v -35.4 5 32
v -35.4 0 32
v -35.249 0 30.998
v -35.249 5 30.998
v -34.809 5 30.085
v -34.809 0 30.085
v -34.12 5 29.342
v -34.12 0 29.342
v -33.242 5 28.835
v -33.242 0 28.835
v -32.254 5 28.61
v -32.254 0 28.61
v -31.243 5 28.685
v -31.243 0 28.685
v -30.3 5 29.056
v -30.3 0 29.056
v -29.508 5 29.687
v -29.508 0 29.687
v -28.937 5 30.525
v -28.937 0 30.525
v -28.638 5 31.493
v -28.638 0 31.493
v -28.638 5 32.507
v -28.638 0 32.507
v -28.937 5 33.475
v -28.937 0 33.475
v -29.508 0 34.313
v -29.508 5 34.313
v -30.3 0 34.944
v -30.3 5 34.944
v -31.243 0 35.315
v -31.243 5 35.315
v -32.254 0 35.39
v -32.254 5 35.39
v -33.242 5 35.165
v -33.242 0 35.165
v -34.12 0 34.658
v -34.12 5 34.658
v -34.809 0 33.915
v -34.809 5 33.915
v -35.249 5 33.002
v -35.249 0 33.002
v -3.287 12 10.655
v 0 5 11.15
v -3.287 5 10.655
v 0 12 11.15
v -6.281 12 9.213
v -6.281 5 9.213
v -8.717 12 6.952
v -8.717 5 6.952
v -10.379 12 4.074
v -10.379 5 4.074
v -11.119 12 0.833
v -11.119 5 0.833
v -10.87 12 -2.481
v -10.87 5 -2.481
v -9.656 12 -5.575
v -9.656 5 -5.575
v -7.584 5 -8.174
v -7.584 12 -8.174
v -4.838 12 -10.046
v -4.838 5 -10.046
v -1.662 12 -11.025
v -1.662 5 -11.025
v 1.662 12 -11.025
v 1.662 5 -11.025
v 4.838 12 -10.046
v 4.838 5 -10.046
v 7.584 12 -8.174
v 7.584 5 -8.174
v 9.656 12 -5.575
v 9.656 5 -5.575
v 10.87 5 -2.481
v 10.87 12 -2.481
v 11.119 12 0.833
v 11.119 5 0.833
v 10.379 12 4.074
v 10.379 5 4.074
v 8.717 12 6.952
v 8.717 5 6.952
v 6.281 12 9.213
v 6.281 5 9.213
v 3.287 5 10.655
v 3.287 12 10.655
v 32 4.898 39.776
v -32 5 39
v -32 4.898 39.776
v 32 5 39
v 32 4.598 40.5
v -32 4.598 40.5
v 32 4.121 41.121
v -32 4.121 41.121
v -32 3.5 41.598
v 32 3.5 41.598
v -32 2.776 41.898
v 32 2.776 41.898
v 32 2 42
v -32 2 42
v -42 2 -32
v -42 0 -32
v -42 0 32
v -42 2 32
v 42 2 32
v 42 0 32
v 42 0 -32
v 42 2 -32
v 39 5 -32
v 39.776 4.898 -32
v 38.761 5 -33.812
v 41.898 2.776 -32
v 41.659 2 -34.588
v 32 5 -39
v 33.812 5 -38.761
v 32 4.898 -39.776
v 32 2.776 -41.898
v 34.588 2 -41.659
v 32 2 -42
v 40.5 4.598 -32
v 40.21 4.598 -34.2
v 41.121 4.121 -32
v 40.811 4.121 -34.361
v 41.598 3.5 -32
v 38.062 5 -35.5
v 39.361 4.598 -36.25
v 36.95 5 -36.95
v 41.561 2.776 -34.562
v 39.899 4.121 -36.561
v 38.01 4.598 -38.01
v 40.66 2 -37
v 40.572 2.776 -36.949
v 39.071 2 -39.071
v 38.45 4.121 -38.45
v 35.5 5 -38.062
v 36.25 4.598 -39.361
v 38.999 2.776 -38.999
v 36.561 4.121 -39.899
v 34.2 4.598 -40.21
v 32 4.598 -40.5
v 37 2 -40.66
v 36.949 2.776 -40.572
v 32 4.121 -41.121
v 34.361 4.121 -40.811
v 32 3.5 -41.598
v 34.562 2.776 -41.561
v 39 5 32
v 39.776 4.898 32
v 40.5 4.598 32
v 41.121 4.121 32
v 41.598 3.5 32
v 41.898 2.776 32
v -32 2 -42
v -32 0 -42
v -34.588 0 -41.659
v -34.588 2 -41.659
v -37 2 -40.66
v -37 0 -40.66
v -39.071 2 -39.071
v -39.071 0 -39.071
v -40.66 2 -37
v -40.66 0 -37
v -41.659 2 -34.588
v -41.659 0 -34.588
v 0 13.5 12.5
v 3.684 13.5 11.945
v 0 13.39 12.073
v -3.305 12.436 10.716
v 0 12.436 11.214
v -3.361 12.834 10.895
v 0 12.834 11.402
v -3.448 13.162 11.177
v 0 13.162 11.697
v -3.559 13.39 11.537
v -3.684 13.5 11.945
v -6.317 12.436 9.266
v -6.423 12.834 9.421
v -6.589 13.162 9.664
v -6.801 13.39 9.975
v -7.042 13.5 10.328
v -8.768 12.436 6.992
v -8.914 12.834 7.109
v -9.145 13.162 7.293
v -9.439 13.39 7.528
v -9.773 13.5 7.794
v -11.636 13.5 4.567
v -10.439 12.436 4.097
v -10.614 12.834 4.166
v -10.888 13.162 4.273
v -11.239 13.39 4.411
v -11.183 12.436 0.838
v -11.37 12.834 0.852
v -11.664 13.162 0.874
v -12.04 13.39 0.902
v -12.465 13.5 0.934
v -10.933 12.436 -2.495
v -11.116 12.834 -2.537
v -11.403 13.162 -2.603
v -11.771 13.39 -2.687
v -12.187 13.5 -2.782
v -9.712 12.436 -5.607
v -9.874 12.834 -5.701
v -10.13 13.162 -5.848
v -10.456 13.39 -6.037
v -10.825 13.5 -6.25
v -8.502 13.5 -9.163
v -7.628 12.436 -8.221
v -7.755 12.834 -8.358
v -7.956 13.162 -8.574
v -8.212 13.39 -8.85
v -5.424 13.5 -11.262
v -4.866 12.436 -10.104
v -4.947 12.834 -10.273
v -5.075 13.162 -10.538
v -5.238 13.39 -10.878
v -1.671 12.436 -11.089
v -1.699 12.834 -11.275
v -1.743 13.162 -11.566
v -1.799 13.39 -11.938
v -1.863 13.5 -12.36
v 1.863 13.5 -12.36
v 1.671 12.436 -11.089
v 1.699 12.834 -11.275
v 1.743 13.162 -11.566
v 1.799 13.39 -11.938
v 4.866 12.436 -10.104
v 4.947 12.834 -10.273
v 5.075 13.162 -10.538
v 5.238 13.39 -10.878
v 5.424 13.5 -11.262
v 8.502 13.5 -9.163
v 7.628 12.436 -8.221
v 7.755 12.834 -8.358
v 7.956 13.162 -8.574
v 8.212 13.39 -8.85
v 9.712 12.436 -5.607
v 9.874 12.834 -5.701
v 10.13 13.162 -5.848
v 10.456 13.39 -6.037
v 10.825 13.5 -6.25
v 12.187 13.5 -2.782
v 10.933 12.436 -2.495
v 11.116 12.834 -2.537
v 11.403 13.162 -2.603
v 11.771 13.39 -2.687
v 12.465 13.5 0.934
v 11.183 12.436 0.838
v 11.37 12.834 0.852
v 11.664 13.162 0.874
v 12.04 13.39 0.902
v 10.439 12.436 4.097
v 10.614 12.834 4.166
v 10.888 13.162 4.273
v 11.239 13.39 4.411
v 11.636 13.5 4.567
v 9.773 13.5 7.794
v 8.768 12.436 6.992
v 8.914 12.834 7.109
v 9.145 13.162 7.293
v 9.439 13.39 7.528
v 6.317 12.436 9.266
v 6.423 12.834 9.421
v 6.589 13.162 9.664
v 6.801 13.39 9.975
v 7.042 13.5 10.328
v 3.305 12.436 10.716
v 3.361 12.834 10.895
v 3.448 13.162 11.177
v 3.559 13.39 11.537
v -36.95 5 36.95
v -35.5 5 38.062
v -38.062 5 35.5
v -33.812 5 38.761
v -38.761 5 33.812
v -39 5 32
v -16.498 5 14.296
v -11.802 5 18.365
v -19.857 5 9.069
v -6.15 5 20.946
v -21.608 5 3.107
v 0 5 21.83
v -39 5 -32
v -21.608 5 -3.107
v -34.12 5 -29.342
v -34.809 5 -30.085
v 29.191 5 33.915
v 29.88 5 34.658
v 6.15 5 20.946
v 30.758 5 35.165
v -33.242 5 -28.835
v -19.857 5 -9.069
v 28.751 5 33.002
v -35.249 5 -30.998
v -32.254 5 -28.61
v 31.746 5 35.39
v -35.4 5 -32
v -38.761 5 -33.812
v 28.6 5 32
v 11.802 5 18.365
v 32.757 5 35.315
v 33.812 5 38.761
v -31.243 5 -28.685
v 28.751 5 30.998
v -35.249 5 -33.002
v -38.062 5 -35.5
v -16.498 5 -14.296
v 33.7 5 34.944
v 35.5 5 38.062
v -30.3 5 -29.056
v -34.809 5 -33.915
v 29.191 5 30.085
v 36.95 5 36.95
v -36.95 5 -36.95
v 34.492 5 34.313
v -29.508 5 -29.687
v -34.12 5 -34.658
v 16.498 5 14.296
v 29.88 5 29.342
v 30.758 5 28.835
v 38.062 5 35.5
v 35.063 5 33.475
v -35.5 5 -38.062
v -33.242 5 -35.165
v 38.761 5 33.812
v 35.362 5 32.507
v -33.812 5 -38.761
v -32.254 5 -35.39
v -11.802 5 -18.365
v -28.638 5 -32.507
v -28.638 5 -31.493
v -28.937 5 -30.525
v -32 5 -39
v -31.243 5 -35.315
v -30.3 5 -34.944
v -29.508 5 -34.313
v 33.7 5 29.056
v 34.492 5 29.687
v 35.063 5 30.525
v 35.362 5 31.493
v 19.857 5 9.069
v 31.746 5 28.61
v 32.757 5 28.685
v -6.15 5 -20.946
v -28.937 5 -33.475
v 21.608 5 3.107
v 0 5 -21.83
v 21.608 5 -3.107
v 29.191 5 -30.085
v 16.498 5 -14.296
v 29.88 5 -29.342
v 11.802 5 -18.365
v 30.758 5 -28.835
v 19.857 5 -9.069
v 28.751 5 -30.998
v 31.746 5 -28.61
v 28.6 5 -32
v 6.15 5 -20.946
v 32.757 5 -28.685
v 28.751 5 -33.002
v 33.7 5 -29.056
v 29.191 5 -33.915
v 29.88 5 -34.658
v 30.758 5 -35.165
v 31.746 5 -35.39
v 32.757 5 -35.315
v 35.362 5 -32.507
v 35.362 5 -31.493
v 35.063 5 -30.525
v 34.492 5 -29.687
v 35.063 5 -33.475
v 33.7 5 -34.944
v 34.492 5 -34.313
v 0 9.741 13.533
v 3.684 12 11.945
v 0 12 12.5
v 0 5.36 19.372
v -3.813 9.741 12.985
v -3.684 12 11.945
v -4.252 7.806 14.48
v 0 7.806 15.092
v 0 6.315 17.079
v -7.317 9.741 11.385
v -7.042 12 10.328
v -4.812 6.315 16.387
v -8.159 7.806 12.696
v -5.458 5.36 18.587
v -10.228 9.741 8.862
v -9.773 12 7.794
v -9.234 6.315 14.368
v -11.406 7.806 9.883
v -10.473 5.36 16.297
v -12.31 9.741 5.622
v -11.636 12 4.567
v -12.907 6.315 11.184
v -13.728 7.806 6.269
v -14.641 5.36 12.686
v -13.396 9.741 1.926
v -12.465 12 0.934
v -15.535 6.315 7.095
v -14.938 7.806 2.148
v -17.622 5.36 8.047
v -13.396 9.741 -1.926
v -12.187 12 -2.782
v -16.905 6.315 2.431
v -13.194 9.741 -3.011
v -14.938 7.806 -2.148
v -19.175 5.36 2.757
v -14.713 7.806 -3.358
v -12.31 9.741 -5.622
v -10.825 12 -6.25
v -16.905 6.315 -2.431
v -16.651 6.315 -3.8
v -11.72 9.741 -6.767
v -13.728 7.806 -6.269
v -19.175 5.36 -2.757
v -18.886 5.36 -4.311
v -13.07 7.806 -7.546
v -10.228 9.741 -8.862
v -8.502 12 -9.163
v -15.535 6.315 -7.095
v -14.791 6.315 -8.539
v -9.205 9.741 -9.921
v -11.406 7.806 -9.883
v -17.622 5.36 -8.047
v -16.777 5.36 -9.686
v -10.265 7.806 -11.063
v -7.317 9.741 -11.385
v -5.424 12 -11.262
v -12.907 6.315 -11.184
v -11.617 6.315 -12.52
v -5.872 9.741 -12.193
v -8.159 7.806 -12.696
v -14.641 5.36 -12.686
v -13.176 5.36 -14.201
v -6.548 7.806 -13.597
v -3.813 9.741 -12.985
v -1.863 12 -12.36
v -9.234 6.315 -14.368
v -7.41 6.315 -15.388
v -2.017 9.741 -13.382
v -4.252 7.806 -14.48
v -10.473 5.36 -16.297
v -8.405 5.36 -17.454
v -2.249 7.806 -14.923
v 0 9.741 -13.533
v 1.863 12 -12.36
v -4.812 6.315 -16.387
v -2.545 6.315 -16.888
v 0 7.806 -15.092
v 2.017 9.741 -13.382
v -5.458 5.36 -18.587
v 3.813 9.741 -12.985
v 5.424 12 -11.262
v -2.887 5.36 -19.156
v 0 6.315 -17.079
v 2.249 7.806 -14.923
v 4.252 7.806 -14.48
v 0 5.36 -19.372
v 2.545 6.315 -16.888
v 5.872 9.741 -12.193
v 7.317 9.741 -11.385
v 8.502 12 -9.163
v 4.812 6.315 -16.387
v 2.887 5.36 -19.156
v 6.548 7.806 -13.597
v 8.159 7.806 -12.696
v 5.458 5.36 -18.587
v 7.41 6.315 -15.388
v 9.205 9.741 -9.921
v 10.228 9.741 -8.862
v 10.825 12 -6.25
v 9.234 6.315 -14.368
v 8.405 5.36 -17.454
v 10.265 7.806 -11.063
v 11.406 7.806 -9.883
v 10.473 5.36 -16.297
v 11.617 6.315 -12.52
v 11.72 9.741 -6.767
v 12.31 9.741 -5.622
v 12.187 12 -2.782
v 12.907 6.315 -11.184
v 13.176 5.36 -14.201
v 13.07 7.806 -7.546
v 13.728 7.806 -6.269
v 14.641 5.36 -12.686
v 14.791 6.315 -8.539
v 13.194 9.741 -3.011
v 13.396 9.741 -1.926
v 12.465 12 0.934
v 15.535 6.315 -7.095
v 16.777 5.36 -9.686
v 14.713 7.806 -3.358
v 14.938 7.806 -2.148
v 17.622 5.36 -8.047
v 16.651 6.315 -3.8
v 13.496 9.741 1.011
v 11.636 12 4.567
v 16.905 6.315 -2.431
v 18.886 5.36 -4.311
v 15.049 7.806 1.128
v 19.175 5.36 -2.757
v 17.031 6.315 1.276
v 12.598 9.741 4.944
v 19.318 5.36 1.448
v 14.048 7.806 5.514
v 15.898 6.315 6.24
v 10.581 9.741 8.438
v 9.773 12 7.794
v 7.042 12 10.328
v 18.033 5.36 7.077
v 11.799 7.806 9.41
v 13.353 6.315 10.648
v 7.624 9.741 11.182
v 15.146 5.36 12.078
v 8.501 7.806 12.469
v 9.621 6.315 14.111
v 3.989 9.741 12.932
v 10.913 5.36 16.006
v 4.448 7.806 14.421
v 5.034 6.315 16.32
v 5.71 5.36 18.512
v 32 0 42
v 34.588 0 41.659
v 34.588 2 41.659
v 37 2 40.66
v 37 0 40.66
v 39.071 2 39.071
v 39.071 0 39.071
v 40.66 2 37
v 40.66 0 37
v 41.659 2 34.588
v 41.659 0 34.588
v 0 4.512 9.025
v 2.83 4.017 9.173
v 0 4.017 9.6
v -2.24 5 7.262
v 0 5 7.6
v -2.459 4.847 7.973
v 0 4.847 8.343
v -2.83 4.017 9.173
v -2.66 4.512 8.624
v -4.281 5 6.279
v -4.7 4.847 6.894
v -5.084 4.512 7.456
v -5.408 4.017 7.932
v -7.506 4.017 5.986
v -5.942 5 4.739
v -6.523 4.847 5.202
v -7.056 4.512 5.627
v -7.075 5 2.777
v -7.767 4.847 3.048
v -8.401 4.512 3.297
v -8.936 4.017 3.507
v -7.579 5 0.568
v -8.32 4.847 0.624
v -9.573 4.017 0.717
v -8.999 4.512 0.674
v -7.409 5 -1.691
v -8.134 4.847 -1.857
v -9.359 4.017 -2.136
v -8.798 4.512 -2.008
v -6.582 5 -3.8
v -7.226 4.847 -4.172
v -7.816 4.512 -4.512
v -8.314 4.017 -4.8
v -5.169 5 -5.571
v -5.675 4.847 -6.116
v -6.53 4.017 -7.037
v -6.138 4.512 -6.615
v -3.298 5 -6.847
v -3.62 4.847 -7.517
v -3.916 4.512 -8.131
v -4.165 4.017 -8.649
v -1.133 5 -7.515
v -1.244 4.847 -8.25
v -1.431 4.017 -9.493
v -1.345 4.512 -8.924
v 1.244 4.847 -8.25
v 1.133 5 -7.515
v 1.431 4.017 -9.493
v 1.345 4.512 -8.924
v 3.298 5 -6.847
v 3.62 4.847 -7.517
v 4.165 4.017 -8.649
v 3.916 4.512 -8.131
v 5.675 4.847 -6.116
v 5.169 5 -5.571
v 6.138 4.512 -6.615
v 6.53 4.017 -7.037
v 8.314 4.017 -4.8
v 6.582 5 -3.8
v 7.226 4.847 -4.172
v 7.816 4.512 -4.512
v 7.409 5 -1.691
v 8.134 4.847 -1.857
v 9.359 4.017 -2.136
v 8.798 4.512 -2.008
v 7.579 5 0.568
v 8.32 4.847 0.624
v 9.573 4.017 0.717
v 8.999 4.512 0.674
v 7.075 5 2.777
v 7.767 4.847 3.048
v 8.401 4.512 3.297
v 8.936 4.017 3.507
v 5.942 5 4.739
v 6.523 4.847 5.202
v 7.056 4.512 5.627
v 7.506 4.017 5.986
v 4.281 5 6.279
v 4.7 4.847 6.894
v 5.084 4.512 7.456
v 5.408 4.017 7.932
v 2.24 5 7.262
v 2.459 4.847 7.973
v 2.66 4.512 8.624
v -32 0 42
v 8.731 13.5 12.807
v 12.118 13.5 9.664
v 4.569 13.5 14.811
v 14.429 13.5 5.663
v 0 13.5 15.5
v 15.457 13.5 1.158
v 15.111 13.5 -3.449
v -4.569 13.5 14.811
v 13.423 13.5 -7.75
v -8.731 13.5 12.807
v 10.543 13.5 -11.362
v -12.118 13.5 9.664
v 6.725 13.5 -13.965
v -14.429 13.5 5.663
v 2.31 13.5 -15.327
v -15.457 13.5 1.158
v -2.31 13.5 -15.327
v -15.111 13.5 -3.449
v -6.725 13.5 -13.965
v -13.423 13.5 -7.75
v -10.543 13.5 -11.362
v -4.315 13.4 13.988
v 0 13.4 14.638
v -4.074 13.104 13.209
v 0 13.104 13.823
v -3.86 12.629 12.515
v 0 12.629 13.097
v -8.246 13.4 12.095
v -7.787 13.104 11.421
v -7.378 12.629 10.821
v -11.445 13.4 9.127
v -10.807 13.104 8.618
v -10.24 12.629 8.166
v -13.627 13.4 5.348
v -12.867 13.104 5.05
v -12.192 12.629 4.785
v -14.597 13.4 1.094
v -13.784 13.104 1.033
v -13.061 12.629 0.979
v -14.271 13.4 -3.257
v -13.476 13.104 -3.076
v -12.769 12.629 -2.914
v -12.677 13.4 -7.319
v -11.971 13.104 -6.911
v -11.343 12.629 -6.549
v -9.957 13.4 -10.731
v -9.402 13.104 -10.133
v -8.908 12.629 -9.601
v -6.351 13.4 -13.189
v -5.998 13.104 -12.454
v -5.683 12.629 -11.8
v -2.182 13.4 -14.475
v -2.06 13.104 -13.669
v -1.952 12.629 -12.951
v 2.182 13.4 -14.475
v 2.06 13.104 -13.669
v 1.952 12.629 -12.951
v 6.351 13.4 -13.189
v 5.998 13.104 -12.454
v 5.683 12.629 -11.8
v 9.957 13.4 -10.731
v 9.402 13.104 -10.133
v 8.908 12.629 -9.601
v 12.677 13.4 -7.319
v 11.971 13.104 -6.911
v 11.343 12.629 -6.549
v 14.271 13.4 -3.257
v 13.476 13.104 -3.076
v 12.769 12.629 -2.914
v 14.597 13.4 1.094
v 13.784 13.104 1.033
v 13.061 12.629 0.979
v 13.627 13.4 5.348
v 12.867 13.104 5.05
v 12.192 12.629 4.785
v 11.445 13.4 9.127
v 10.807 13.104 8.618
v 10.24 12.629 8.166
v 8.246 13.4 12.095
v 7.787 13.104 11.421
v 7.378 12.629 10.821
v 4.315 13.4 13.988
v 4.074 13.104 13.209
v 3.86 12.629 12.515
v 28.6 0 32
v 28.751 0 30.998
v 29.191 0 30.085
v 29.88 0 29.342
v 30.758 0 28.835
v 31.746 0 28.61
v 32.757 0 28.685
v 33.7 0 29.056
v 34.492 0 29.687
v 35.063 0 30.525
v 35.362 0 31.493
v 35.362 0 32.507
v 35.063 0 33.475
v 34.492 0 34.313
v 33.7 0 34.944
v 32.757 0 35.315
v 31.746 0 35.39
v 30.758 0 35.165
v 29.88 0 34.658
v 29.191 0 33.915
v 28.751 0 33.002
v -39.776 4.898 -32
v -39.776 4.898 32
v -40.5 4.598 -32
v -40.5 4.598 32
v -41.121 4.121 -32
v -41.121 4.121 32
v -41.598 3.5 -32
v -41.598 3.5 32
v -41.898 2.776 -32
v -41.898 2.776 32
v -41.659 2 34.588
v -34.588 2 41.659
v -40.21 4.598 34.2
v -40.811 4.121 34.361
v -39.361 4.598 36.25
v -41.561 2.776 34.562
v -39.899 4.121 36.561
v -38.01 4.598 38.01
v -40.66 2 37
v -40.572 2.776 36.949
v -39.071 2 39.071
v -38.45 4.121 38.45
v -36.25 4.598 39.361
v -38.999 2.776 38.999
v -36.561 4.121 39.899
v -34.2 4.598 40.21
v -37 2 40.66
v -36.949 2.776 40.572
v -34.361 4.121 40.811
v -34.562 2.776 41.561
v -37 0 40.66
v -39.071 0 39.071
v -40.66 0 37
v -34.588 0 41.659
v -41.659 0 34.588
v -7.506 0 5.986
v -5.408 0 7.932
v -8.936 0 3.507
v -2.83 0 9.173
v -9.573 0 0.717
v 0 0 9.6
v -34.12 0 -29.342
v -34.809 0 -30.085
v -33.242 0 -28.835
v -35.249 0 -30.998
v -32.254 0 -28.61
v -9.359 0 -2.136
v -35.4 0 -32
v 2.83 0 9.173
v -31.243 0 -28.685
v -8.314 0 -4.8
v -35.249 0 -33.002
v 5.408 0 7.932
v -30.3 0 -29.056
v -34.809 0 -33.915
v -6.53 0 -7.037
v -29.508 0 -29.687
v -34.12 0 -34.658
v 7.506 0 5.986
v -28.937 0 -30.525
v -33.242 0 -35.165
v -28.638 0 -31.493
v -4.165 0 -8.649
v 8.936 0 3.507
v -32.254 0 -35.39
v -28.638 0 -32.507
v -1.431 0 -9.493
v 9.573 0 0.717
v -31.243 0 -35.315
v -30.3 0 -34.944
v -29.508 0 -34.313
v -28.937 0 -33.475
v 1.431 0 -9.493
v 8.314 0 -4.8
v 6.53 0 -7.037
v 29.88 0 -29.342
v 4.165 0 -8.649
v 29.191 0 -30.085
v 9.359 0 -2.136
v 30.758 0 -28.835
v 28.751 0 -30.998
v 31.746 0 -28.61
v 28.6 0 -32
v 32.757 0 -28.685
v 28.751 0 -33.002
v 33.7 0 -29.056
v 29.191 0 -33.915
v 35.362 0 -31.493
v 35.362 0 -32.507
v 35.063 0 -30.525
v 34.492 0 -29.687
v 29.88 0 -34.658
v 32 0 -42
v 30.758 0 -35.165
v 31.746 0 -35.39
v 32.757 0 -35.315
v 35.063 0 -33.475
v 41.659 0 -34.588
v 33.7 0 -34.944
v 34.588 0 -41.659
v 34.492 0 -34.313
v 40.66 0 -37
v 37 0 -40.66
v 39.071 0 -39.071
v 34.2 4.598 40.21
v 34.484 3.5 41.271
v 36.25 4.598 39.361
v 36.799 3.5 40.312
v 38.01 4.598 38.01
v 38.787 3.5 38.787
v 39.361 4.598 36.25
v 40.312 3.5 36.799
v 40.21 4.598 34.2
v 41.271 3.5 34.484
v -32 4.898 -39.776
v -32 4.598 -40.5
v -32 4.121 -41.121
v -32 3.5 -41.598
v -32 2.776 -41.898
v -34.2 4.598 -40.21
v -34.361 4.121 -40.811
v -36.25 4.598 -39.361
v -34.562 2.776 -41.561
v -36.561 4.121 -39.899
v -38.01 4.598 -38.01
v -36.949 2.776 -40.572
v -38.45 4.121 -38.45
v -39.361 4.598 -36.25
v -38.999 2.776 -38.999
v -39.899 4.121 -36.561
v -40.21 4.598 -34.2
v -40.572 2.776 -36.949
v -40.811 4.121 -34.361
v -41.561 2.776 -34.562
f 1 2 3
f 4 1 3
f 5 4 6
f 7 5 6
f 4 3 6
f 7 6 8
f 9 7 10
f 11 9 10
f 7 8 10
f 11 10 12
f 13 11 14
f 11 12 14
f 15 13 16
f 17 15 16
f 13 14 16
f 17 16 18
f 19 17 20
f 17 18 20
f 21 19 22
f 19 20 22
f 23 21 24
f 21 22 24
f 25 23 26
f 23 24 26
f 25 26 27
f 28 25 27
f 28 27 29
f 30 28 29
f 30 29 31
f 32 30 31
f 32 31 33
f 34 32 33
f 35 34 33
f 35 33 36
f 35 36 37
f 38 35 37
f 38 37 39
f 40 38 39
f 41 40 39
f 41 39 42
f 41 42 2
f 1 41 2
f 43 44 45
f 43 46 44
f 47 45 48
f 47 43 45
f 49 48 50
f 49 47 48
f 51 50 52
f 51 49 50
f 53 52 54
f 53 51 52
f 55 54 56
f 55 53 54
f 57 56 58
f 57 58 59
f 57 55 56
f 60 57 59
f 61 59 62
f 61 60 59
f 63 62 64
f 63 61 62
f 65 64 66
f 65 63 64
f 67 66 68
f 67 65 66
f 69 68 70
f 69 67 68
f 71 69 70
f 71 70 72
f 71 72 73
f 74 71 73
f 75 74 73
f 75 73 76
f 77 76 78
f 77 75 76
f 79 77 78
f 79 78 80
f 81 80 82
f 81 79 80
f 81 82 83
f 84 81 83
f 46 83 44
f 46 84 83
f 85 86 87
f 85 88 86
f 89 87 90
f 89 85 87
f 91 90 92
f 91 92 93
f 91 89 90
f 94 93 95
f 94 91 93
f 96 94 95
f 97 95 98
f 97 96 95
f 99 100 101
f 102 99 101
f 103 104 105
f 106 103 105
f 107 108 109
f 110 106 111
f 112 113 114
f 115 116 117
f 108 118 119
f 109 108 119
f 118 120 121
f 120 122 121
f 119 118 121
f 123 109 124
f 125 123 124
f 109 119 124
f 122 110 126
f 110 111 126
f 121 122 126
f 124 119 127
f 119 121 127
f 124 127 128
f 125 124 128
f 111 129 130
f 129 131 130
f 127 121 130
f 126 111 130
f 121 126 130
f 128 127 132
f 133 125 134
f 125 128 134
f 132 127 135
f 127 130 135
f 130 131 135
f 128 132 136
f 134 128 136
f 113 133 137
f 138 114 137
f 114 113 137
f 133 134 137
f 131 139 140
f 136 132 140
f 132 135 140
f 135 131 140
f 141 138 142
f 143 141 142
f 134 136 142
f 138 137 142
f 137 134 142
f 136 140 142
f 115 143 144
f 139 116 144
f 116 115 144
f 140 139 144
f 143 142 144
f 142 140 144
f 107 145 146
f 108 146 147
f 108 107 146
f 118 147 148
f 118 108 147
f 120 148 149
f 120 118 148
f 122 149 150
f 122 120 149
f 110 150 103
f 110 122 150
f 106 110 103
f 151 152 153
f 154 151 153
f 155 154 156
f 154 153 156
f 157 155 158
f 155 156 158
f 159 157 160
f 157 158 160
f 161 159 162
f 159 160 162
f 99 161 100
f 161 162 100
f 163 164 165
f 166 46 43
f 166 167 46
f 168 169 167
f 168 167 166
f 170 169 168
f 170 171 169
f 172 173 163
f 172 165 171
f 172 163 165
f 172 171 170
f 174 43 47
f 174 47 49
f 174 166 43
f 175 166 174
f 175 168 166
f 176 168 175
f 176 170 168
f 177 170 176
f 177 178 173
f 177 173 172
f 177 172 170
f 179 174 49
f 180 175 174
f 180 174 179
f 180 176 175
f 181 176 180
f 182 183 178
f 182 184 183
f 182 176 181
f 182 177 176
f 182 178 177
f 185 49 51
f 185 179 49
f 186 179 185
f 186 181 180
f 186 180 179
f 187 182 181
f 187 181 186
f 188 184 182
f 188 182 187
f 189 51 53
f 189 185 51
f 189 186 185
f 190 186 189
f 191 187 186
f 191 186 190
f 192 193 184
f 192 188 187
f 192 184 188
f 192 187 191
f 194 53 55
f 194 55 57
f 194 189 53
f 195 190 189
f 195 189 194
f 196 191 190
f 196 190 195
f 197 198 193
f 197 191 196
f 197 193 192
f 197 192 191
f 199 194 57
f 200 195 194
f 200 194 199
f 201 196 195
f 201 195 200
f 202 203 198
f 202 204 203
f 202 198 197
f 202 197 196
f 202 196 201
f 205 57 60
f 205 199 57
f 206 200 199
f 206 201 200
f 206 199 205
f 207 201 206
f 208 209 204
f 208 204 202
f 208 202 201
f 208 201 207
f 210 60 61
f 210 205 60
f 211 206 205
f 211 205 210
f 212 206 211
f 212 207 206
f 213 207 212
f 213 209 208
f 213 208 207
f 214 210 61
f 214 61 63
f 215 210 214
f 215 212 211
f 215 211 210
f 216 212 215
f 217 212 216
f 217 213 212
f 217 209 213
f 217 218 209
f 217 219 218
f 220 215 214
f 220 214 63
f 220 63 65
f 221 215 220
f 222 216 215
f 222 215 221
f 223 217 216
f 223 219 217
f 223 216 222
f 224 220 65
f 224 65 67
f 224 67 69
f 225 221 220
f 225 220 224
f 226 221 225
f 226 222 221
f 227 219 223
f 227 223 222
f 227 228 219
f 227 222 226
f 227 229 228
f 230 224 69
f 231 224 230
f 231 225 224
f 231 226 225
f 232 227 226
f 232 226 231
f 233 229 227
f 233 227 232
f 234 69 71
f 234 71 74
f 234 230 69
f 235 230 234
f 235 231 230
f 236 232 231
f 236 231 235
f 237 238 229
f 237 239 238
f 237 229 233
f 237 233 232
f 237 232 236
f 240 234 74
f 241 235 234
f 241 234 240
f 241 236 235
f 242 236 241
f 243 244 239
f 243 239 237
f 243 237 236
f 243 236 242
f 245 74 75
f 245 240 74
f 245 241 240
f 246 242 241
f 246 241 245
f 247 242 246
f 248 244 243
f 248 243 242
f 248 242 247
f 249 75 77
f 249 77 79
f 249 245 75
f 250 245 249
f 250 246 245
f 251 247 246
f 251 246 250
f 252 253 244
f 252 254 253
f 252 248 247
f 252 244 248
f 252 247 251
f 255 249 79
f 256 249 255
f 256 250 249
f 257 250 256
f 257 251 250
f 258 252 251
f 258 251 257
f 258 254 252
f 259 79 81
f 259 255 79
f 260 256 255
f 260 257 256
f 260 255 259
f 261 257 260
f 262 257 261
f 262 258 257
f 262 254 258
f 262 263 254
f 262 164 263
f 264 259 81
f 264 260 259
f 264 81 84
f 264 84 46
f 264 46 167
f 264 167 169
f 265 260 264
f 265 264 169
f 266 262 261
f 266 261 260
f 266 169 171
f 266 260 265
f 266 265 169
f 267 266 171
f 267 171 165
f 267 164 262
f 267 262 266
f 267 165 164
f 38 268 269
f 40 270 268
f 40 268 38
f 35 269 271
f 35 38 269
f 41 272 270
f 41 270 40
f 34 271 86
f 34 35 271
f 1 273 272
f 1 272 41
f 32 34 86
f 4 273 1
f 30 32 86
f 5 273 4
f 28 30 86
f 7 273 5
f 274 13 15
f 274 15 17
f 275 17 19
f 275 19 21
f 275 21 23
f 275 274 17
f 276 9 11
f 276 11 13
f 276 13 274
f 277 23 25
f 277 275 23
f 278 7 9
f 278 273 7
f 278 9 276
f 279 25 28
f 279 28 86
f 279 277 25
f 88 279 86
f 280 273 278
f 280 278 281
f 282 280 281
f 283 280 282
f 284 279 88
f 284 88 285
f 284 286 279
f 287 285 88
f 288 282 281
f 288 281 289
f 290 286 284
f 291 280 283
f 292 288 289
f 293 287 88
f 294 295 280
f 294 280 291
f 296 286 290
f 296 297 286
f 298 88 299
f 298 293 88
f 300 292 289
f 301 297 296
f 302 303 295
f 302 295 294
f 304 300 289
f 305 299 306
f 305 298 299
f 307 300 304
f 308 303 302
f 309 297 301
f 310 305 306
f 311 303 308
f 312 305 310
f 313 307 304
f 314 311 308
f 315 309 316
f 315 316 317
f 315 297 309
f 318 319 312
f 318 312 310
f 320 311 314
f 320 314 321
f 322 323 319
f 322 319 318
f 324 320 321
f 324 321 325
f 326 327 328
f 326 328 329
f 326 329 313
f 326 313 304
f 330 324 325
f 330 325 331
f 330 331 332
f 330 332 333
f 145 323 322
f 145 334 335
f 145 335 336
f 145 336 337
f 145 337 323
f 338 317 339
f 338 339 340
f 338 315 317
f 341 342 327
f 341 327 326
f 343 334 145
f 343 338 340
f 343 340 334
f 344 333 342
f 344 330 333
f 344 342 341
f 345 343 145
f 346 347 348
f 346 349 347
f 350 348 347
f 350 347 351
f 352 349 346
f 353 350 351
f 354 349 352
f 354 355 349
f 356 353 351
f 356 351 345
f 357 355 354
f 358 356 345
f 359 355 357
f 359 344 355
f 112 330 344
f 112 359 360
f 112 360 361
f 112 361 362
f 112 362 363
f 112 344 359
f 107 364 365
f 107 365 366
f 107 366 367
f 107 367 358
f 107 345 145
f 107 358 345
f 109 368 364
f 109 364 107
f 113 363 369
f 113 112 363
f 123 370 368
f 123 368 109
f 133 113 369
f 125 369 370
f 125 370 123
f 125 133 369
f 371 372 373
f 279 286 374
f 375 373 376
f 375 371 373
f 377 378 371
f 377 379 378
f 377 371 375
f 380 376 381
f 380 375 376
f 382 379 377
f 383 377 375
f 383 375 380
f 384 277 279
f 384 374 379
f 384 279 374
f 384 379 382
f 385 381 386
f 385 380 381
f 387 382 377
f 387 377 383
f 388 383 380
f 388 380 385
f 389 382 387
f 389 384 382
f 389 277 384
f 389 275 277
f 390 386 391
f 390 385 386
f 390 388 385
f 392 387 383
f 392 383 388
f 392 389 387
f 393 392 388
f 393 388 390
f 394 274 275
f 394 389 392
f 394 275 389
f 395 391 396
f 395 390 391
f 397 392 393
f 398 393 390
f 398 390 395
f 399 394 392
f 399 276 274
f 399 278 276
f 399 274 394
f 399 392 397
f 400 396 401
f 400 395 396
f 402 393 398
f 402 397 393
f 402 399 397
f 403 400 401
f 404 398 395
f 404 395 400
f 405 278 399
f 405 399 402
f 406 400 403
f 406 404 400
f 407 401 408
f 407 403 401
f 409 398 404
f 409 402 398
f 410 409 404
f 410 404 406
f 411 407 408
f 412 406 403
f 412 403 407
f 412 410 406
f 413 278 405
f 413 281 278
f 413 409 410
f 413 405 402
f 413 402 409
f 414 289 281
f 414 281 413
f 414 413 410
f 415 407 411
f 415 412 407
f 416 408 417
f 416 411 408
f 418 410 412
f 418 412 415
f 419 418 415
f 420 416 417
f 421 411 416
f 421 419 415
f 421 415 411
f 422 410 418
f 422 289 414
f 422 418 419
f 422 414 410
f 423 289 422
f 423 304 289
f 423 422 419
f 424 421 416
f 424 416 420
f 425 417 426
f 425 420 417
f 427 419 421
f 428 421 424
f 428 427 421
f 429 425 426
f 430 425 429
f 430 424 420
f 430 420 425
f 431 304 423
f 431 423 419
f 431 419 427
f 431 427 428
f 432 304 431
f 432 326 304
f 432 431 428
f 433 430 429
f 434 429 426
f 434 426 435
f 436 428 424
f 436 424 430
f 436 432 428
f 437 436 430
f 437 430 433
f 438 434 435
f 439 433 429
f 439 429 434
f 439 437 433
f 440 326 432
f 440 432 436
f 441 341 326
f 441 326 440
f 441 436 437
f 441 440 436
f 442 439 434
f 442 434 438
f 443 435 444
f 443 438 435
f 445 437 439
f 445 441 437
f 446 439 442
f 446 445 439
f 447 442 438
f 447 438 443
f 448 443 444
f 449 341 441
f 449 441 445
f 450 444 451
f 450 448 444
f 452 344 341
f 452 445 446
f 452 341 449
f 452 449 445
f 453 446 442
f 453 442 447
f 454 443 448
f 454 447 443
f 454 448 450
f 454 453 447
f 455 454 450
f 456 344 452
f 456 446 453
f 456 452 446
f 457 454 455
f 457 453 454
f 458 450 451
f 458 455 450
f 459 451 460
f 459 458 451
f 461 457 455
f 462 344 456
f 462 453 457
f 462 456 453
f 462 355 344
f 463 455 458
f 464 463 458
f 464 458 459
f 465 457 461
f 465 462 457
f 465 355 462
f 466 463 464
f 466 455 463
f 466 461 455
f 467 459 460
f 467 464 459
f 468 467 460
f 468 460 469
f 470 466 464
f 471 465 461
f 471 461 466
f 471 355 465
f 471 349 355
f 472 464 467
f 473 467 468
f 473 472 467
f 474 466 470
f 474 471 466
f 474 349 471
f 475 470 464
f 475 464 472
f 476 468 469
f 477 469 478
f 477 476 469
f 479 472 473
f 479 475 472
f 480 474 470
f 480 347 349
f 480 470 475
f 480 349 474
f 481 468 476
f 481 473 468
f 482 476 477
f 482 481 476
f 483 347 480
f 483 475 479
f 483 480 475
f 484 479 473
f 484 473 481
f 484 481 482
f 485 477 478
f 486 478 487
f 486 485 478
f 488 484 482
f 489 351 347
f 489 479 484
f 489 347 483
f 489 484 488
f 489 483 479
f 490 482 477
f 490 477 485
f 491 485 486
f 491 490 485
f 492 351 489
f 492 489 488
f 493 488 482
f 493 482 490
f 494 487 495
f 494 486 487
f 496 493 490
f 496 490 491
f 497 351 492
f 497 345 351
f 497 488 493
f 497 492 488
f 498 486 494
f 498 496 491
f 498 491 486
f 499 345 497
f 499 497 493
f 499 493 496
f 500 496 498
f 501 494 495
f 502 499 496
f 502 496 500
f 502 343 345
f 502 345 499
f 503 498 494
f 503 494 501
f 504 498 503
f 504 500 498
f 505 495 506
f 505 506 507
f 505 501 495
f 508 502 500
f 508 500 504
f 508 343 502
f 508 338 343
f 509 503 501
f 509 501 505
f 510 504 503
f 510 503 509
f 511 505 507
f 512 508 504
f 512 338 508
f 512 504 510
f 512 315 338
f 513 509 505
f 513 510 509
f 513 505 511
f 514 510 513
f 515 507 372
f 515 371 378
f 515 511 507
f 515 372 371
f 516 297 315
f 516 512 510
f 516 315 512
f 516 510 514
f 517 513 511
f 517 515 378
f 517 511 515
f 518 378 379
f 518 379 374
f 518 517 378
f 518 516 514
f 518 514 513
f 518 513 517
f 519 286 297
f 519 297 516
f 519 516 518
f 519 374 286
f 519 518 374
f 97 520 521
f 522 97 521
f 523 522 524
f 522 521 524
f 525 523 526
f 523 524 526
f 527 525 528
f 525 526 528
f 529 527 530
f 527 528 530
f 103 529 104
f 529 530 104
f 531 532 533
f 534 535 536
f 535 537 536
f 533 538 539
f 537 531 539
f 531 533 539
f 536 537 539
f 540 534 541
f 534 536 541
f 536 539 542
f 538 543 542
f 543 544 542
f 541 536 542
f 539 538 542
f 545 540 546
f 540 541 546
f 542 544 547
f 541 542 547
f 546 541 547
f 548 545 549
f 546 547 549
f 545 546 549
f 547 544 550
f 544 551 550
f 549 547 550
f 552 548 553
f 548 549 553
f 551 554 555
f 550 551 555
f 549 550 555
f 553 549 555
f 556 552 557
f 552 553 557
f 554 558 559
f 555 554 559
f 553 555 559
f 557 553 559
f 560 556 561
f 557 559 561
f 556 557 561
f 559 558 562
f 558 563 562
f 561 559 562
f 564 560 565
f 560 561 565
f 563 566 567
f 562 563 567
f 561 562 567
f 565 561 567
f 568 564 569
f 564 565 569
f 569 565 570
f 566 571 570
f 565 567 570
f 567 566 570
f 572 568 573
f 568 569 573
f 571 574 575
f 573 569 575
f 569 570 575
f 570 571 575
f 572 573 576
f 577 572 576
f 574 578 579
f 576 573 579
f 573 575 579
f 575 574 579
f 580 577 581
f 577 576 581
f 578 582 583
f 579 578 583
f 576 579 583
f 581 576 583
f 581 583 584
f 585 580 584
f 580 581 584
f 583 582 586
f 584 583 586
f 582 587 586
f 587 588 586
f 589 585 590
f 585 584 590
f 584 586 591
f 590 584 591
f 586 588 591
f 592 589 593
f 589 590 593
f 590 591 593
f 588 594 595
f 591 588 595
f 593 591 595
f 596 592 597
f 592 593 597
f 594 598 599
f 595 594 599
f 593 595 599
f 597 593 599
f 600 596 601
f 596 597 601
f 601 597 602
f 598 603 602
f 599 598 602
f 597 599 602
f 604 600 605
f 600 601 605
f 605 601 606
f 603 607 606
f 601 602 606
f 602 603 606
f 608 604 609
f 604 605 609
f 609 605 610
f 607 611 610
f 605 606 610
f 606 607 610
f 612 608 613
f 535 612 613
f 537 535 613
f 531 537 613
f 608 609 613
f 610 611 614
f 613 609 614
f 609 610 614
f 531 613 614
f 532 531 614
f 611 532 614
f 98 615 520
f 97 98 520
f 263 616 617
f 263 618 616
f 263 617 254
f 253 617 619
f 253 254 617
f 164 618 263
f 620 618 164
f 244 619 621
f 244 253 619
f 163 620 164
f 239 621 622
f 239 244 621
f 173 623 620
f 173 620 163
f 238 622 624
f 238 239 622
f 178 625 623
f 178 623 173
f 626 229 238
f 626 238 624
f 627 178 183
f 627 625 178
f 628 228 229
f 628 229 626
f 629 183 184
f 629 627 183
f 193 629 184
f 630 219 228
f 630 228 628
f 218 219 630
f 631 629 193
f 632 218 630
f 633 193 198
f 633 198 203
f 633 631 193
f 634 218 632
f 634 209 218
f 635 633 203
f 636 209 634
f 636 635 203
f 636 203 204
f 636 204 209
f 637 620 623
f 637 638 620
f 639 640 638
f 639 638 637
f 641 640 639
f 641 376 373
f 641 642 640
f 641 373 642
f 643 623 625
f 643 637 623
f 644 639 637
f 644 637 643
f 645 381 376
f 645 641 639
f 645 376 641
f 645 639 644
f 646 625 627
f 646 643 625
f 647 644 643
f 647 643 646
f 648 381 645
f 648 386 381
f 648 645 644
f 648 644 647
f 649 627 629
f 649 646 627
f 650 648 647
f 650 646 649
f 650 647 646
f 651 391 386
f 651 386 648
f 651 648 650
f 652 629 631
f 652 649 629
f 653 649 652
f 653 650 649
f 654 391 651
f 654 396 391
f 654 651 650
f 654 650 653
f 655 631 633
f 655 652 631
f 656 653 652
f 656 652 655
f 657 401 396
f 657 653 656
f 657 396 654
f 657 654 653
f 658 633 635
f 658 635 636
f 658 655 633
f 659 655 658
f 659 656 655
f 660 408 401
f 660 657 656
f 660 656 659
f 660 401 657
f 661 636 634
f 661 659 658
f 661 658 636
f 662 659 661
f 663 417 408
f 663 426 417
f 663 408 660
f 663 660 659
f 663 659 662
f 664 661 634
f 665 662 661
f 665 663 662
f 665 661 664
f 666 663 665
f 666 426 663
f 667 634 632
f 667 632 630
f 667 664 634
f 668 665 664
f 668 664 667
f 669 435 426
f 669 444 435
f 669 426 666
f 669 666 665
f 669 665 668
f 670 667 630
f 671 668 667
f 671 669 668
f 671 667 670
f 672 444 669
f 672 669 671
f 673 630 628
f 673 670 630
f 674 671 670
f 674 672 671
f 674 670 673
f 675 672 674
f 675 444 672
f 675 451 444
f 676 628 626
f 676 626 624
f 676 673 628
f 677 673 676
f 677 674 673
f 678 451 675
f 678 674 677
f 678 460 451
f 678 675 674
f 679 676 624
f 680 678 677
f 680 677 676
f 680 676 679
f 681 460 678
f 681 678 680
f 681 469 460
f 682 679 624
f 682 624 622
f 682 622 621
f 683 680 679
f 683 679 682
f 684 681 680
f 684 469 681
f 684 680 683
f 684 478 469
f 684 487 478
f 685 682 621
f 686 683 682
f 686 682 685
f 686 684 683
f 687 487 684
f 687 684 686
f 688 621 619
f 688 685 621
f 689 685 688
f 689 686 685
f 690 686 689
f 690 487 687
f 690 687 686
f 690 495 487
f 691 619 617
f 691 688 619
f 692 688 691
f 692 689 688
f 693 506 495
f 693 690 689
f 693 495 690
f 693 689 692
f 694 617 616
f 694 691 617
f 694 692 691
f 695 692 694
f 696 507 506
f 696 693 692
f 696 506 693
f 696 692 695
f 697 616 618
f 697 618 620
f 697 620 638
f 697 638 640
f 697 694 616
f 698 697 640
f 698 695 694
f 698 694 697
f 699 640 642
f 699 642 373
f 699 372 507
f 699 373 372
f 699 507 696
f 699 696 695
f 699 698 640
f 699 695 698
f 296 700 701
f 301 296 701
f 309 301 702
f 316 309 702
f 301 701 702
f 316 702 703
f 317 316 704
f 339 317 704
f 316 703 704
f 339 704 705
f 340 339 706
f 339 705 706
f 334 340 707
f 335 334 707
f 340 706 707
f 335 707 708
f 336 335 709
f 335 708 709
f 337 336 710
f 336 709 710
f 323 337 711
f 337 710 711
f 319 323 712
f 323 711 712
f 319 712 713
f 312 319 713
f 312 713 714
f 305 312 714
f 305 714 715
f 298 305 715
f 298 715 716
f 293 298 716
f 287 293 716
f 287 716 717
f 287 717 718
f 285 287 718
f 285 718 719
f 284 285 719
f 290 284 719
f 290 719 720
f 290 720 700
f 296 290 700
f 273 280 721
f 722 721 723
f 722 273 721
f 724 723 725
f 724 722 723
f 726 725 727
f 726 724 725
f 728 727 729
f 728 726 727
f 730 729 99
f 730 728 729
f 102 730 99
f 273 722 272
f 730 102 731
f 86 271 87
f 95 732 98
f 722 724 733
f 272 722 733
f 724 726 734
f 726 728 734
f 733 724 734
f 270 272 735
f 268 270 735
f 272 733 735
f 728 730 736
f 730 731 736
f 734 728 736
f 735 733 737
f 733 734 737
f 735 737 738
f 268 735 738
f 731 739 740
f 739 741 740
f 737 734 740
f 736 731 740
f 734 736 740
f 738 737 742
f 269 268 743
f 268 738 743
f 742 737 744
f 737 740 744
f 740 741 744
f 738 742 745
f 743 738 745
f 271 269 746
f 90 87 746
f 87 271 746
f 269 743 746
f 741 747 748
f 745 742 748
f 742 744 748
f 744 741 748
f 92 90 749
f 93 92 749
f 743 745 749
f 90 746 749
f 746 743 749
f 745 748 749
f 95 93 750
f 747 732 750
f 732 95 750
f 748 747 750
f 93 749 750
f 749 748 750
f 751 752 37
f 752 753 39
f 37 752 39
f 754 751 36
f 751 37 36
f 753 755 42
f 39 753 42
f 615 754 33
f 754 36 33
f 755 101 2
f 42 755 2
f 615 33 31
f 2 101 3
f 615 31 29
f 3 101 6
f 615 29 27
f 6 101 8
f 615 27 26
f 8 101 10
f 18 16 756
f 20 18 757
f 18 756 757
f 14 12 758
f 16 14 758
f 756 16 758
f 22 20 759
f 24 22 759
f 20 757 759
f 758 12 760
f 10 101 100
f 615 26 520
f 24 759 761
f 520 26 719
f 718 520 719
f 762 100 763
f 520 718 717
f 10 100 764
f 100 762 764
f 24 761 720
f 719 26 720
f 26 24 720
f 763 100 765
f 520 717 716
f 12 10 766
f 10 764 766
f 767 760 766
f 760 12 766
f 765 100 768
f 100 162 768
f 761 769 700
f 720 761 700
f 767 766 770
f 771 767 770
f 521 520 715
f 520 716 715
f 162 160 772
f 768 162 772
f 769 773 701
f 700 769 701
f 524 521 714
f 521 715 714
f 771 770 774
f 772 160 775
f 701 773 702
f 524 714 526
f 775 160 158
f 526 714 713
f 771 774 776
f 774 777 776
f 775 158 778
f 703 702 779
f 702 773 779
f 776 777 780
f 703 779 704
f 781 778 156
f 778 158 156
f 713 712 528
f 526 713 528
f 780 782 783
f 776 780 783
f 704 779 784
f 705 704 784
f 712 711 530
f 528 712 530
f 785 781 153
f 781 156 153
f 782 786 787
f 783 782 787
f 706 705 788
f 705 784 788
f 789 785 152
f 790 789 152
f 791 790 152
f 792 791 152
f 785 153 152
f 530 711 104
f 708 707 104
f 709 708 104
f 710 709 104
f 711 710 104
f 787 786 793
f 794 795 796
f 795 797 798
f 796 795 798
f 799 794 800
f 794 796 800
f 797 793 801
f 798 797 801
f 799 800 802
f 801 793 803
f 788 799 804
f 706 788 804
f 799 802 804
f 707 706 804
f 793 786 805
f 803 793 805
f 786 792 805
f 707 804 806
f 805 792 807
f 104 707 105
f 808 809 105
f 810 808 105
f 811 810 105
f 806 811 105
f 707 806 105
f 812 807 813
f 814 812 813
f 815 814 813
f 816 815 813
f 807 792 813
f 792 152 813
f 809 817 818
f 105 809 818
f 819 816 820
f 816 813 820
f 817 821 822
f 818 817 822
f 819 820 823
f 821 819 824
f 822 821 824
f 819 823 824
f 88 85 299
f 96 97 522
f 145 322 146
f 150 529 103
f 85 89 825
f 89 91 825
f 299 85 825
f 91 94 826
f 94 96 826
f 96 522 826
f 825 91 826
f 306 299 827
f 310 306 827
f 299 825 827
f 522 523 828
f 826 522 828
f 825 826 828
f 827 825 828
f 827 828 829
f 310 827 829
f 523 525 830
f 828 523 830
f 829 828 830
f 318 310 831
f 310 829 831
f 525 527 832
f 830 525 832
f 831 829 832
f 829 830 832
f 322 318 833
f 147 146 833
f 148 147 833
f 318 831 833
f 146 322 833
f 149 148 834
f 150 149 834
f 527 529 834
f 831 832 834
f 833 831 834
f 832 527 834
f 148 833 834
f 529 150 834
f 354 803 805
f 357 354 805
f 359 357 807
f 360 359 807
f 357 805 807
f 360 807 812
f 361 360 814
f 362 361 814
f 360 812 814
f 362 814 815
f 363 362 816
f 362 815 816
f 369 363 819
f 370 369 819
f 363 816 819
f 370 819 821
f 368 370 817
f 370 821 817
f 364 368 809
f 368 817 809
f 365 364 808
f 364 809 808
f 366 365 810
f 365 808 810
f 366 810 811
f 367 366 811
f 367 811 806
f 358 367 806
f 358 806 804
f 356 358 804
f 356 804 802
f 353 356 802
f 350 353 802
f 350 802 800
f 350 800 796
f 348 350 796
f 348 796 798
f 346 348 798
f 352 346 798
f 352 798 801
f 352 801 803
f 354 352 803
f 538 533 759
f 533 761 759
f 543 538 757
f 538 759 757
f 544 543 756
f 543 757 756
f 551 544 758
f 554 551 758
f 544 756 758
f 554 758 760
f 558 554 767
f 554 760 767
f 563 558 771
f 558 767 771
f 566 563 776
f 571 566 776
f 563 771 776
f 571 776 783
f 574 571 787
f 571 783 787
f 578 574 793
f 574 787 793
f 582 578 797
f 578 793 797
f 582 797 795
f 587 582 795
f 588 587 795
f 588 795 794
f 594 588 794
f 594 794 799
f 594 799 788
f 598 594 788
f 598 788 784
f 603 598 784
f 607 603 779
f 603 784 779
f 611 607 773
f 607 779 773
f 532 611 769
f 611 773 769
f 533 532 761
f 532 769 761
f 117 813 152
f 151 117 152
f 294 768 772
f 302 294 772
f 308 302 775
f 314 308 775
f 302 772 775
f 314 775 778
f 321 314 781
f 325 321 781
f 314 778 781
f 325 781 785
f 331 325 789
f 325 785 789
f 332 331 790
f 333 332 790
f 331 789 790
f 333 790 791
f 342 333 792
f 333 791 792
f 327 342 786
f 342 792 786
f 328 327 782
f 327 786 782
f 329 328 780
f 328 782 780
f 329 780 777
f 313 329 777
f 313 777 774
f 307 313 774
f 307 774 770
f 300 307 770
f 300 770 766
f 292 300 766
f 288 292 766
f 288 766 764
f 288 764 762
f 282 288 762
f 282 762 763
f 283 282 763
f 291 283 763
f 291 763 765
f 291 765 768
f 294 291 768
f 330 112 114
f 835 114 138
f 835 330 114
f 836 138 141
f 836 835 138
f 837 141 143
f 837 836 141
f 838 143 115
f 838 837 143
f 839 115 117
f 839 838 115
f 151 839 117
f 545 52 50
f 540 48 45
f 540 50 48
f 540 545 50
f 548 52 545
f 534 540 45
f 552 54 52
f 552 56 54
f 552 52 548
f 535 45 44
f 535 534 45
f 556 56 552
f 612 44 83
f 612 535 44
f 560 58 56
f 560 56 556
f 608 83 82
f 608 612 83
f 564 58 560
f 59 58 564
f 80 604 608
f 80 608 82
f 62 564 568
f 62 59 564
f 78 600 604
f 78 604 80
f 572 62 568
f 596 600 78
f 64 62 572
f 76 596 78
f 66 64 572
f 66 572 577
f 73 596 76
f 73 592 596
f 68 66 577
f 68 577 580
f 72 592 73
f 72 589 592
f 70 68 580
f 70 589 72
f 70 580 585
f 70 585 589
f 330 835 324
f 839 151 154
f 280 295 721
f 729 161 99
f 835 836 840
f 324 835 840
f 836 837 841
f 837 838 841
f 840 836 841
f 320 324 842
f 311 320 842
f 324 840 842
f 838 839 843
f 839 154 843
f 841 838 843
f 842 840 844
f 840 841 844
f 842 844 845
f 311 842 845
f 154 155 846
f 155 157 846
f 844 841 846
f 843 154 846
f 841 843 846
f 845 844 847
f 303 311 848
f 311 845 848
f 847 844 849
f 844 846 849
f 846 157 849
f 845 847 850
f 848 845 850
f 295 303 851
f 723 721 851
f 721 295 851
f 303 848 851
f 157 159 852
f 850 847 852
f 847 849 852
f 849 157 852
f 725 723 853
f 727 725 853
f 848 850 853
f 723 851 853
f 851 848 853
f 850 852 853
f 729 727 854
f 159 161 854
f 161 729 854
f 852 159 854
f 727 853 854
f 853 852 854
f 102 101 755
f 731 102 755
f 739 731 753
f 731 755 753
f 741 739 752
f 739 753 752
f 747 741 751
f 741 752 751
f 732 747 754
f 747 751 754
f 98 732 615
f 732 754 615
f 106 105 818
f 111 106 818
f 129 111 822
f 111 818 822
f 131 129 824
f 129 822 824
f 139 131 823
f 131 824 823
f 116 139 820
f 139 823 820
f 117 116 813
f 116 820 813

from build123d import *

# Parameters (mm, degrees)
BOSS_EXTRUDE1_DEPTH              = 5
FILLET1_R                        = 3
TAP_DRILL_FOR_M8X1_25_TAP1_D     = 6.8
TAP_DRILL_FOR_M8X1_25_TAP1_DEPTH = 8
TAP_DRILL_FOR_M8X1_25_TAP1_TIP   = 2.042926105


with BuildPart() as part:
    # Sketch1 → Boss-Extrude1 (new body)
    with BuildSketch(Plane(origin=(0, 0, 0), x_dir=(1, 0, 0), z_dir=(0, 1, 0))):
        with BuildLine():
            Line((32, 42), (-32, 42))
            ThreePointArc((-32, 42), (-39.071067812, 39.071067812), (-42, 32))
            Line((-42, 32), (-42, -32))
            ThreePointArc((-42, -32), (-39.071067812, -39.071067812), (-32, -42))
            Line((-32, -42), (32, -42))
            ThreePointArc((32, -42), (39.071067812, -39.071067812), (42, -32))
            Line((42, -32), (42, 32))
            ThreePointArc((42, 32), (39.071067812, 39.071067812), (32, 42))
        make_face()
    extrude(amount=BOSS_EXTRUDE1_DEPTH)

    # Sketch3 → Revolve2 (revolve)
    with BuildSketch(Plane.XY):
        with BuildLine():
            Line((-21.830169384, 5), (-11.15, 5))
            Line((-11.15, 5), (-11.15, 12))
            ThreePointArc((-11.15, 12), (-11.537197996, 13.009021804), (-12.5, 13.5))
            Line((-12.5, 13.5), (-15.5, 13.5))
            ThreePointArc((-15.5, 13.5), (-13.822949017, 13.104101966), (-12.5, 12))
            ThreePointArc((-12.5, 12), (-16.03878275, 6.998773158), (-21.830169384, 5))
        make_face()
    revolve(axis=Axis((0, 0, 0), (0, -1, 0)))

    # Sketch3<5> → Cut-Revolve2 (revolve, cut)
    with BuildSketch(Plane.XY):
        with BuildLine():
            Line((0, 0), (0, 5))
            Line((0, 5), (-7.6, 5))
            ThreePointArc((-7.6, 5), (-8.694616444, 4.701278719), (-9.6, 4.017392631))
            Line((-9.6, 4.017392631), (-9.6, 0))
            Line((-9.6, 0), (0, 0))
        make_face()
    revolve(axis=Axis((0, 0, 0), (0, -1, 0)), mode=Mode.SUBTRACT)

    # Fillet1
    fillet1_edges = [part.edges().sort_by_distance(p)[0] for p in [
        (42, 5, 0),
        (39.071067812, 5, -39.071067812),
        (0, 5, -42),
        (-39.071067812, 5, -39.071067812),
        (-42, 5, 0),
        (-39.071067812, 5, 39.071067812),
        (0, 5, 42),
        (39.071067812, 5, 39.071067812),
    ]]
    fillet(fillet1_edges, radius=FILLET1_R)

    # Tap Drill for M8x1.25 Tap1
    with Locations(Plane(origin=(0, 5, 0), x_dir=(1, 0, 0), z_dir=(0, 1, 0))):
        with Locations((-32, 32), (-32, -32), (32, -32), (32, 32)):
            Hole(TAP_DRILL_FOR_M8X1_25_TAP1_D / 2, depth=TAP_DRILL_FOR_M8X1_25_TAP1_DEPTH)
            with Locations((0, 0, -(TAP_DRILL_FOR_M8X1_25_TAP1_DEPTH + TAP_DRILL_FOR_M8X1_25_TAP1_TIP / 2))):  # 118° drill point
                Cone(0, TAP_DRILL_FOR_M8X1_25_TAP1_D / 2, TAP_DRILL_FOR_M8X1_25_TAP1_TIP, mode=Mode.SUBTRACT)


solid = part.part
